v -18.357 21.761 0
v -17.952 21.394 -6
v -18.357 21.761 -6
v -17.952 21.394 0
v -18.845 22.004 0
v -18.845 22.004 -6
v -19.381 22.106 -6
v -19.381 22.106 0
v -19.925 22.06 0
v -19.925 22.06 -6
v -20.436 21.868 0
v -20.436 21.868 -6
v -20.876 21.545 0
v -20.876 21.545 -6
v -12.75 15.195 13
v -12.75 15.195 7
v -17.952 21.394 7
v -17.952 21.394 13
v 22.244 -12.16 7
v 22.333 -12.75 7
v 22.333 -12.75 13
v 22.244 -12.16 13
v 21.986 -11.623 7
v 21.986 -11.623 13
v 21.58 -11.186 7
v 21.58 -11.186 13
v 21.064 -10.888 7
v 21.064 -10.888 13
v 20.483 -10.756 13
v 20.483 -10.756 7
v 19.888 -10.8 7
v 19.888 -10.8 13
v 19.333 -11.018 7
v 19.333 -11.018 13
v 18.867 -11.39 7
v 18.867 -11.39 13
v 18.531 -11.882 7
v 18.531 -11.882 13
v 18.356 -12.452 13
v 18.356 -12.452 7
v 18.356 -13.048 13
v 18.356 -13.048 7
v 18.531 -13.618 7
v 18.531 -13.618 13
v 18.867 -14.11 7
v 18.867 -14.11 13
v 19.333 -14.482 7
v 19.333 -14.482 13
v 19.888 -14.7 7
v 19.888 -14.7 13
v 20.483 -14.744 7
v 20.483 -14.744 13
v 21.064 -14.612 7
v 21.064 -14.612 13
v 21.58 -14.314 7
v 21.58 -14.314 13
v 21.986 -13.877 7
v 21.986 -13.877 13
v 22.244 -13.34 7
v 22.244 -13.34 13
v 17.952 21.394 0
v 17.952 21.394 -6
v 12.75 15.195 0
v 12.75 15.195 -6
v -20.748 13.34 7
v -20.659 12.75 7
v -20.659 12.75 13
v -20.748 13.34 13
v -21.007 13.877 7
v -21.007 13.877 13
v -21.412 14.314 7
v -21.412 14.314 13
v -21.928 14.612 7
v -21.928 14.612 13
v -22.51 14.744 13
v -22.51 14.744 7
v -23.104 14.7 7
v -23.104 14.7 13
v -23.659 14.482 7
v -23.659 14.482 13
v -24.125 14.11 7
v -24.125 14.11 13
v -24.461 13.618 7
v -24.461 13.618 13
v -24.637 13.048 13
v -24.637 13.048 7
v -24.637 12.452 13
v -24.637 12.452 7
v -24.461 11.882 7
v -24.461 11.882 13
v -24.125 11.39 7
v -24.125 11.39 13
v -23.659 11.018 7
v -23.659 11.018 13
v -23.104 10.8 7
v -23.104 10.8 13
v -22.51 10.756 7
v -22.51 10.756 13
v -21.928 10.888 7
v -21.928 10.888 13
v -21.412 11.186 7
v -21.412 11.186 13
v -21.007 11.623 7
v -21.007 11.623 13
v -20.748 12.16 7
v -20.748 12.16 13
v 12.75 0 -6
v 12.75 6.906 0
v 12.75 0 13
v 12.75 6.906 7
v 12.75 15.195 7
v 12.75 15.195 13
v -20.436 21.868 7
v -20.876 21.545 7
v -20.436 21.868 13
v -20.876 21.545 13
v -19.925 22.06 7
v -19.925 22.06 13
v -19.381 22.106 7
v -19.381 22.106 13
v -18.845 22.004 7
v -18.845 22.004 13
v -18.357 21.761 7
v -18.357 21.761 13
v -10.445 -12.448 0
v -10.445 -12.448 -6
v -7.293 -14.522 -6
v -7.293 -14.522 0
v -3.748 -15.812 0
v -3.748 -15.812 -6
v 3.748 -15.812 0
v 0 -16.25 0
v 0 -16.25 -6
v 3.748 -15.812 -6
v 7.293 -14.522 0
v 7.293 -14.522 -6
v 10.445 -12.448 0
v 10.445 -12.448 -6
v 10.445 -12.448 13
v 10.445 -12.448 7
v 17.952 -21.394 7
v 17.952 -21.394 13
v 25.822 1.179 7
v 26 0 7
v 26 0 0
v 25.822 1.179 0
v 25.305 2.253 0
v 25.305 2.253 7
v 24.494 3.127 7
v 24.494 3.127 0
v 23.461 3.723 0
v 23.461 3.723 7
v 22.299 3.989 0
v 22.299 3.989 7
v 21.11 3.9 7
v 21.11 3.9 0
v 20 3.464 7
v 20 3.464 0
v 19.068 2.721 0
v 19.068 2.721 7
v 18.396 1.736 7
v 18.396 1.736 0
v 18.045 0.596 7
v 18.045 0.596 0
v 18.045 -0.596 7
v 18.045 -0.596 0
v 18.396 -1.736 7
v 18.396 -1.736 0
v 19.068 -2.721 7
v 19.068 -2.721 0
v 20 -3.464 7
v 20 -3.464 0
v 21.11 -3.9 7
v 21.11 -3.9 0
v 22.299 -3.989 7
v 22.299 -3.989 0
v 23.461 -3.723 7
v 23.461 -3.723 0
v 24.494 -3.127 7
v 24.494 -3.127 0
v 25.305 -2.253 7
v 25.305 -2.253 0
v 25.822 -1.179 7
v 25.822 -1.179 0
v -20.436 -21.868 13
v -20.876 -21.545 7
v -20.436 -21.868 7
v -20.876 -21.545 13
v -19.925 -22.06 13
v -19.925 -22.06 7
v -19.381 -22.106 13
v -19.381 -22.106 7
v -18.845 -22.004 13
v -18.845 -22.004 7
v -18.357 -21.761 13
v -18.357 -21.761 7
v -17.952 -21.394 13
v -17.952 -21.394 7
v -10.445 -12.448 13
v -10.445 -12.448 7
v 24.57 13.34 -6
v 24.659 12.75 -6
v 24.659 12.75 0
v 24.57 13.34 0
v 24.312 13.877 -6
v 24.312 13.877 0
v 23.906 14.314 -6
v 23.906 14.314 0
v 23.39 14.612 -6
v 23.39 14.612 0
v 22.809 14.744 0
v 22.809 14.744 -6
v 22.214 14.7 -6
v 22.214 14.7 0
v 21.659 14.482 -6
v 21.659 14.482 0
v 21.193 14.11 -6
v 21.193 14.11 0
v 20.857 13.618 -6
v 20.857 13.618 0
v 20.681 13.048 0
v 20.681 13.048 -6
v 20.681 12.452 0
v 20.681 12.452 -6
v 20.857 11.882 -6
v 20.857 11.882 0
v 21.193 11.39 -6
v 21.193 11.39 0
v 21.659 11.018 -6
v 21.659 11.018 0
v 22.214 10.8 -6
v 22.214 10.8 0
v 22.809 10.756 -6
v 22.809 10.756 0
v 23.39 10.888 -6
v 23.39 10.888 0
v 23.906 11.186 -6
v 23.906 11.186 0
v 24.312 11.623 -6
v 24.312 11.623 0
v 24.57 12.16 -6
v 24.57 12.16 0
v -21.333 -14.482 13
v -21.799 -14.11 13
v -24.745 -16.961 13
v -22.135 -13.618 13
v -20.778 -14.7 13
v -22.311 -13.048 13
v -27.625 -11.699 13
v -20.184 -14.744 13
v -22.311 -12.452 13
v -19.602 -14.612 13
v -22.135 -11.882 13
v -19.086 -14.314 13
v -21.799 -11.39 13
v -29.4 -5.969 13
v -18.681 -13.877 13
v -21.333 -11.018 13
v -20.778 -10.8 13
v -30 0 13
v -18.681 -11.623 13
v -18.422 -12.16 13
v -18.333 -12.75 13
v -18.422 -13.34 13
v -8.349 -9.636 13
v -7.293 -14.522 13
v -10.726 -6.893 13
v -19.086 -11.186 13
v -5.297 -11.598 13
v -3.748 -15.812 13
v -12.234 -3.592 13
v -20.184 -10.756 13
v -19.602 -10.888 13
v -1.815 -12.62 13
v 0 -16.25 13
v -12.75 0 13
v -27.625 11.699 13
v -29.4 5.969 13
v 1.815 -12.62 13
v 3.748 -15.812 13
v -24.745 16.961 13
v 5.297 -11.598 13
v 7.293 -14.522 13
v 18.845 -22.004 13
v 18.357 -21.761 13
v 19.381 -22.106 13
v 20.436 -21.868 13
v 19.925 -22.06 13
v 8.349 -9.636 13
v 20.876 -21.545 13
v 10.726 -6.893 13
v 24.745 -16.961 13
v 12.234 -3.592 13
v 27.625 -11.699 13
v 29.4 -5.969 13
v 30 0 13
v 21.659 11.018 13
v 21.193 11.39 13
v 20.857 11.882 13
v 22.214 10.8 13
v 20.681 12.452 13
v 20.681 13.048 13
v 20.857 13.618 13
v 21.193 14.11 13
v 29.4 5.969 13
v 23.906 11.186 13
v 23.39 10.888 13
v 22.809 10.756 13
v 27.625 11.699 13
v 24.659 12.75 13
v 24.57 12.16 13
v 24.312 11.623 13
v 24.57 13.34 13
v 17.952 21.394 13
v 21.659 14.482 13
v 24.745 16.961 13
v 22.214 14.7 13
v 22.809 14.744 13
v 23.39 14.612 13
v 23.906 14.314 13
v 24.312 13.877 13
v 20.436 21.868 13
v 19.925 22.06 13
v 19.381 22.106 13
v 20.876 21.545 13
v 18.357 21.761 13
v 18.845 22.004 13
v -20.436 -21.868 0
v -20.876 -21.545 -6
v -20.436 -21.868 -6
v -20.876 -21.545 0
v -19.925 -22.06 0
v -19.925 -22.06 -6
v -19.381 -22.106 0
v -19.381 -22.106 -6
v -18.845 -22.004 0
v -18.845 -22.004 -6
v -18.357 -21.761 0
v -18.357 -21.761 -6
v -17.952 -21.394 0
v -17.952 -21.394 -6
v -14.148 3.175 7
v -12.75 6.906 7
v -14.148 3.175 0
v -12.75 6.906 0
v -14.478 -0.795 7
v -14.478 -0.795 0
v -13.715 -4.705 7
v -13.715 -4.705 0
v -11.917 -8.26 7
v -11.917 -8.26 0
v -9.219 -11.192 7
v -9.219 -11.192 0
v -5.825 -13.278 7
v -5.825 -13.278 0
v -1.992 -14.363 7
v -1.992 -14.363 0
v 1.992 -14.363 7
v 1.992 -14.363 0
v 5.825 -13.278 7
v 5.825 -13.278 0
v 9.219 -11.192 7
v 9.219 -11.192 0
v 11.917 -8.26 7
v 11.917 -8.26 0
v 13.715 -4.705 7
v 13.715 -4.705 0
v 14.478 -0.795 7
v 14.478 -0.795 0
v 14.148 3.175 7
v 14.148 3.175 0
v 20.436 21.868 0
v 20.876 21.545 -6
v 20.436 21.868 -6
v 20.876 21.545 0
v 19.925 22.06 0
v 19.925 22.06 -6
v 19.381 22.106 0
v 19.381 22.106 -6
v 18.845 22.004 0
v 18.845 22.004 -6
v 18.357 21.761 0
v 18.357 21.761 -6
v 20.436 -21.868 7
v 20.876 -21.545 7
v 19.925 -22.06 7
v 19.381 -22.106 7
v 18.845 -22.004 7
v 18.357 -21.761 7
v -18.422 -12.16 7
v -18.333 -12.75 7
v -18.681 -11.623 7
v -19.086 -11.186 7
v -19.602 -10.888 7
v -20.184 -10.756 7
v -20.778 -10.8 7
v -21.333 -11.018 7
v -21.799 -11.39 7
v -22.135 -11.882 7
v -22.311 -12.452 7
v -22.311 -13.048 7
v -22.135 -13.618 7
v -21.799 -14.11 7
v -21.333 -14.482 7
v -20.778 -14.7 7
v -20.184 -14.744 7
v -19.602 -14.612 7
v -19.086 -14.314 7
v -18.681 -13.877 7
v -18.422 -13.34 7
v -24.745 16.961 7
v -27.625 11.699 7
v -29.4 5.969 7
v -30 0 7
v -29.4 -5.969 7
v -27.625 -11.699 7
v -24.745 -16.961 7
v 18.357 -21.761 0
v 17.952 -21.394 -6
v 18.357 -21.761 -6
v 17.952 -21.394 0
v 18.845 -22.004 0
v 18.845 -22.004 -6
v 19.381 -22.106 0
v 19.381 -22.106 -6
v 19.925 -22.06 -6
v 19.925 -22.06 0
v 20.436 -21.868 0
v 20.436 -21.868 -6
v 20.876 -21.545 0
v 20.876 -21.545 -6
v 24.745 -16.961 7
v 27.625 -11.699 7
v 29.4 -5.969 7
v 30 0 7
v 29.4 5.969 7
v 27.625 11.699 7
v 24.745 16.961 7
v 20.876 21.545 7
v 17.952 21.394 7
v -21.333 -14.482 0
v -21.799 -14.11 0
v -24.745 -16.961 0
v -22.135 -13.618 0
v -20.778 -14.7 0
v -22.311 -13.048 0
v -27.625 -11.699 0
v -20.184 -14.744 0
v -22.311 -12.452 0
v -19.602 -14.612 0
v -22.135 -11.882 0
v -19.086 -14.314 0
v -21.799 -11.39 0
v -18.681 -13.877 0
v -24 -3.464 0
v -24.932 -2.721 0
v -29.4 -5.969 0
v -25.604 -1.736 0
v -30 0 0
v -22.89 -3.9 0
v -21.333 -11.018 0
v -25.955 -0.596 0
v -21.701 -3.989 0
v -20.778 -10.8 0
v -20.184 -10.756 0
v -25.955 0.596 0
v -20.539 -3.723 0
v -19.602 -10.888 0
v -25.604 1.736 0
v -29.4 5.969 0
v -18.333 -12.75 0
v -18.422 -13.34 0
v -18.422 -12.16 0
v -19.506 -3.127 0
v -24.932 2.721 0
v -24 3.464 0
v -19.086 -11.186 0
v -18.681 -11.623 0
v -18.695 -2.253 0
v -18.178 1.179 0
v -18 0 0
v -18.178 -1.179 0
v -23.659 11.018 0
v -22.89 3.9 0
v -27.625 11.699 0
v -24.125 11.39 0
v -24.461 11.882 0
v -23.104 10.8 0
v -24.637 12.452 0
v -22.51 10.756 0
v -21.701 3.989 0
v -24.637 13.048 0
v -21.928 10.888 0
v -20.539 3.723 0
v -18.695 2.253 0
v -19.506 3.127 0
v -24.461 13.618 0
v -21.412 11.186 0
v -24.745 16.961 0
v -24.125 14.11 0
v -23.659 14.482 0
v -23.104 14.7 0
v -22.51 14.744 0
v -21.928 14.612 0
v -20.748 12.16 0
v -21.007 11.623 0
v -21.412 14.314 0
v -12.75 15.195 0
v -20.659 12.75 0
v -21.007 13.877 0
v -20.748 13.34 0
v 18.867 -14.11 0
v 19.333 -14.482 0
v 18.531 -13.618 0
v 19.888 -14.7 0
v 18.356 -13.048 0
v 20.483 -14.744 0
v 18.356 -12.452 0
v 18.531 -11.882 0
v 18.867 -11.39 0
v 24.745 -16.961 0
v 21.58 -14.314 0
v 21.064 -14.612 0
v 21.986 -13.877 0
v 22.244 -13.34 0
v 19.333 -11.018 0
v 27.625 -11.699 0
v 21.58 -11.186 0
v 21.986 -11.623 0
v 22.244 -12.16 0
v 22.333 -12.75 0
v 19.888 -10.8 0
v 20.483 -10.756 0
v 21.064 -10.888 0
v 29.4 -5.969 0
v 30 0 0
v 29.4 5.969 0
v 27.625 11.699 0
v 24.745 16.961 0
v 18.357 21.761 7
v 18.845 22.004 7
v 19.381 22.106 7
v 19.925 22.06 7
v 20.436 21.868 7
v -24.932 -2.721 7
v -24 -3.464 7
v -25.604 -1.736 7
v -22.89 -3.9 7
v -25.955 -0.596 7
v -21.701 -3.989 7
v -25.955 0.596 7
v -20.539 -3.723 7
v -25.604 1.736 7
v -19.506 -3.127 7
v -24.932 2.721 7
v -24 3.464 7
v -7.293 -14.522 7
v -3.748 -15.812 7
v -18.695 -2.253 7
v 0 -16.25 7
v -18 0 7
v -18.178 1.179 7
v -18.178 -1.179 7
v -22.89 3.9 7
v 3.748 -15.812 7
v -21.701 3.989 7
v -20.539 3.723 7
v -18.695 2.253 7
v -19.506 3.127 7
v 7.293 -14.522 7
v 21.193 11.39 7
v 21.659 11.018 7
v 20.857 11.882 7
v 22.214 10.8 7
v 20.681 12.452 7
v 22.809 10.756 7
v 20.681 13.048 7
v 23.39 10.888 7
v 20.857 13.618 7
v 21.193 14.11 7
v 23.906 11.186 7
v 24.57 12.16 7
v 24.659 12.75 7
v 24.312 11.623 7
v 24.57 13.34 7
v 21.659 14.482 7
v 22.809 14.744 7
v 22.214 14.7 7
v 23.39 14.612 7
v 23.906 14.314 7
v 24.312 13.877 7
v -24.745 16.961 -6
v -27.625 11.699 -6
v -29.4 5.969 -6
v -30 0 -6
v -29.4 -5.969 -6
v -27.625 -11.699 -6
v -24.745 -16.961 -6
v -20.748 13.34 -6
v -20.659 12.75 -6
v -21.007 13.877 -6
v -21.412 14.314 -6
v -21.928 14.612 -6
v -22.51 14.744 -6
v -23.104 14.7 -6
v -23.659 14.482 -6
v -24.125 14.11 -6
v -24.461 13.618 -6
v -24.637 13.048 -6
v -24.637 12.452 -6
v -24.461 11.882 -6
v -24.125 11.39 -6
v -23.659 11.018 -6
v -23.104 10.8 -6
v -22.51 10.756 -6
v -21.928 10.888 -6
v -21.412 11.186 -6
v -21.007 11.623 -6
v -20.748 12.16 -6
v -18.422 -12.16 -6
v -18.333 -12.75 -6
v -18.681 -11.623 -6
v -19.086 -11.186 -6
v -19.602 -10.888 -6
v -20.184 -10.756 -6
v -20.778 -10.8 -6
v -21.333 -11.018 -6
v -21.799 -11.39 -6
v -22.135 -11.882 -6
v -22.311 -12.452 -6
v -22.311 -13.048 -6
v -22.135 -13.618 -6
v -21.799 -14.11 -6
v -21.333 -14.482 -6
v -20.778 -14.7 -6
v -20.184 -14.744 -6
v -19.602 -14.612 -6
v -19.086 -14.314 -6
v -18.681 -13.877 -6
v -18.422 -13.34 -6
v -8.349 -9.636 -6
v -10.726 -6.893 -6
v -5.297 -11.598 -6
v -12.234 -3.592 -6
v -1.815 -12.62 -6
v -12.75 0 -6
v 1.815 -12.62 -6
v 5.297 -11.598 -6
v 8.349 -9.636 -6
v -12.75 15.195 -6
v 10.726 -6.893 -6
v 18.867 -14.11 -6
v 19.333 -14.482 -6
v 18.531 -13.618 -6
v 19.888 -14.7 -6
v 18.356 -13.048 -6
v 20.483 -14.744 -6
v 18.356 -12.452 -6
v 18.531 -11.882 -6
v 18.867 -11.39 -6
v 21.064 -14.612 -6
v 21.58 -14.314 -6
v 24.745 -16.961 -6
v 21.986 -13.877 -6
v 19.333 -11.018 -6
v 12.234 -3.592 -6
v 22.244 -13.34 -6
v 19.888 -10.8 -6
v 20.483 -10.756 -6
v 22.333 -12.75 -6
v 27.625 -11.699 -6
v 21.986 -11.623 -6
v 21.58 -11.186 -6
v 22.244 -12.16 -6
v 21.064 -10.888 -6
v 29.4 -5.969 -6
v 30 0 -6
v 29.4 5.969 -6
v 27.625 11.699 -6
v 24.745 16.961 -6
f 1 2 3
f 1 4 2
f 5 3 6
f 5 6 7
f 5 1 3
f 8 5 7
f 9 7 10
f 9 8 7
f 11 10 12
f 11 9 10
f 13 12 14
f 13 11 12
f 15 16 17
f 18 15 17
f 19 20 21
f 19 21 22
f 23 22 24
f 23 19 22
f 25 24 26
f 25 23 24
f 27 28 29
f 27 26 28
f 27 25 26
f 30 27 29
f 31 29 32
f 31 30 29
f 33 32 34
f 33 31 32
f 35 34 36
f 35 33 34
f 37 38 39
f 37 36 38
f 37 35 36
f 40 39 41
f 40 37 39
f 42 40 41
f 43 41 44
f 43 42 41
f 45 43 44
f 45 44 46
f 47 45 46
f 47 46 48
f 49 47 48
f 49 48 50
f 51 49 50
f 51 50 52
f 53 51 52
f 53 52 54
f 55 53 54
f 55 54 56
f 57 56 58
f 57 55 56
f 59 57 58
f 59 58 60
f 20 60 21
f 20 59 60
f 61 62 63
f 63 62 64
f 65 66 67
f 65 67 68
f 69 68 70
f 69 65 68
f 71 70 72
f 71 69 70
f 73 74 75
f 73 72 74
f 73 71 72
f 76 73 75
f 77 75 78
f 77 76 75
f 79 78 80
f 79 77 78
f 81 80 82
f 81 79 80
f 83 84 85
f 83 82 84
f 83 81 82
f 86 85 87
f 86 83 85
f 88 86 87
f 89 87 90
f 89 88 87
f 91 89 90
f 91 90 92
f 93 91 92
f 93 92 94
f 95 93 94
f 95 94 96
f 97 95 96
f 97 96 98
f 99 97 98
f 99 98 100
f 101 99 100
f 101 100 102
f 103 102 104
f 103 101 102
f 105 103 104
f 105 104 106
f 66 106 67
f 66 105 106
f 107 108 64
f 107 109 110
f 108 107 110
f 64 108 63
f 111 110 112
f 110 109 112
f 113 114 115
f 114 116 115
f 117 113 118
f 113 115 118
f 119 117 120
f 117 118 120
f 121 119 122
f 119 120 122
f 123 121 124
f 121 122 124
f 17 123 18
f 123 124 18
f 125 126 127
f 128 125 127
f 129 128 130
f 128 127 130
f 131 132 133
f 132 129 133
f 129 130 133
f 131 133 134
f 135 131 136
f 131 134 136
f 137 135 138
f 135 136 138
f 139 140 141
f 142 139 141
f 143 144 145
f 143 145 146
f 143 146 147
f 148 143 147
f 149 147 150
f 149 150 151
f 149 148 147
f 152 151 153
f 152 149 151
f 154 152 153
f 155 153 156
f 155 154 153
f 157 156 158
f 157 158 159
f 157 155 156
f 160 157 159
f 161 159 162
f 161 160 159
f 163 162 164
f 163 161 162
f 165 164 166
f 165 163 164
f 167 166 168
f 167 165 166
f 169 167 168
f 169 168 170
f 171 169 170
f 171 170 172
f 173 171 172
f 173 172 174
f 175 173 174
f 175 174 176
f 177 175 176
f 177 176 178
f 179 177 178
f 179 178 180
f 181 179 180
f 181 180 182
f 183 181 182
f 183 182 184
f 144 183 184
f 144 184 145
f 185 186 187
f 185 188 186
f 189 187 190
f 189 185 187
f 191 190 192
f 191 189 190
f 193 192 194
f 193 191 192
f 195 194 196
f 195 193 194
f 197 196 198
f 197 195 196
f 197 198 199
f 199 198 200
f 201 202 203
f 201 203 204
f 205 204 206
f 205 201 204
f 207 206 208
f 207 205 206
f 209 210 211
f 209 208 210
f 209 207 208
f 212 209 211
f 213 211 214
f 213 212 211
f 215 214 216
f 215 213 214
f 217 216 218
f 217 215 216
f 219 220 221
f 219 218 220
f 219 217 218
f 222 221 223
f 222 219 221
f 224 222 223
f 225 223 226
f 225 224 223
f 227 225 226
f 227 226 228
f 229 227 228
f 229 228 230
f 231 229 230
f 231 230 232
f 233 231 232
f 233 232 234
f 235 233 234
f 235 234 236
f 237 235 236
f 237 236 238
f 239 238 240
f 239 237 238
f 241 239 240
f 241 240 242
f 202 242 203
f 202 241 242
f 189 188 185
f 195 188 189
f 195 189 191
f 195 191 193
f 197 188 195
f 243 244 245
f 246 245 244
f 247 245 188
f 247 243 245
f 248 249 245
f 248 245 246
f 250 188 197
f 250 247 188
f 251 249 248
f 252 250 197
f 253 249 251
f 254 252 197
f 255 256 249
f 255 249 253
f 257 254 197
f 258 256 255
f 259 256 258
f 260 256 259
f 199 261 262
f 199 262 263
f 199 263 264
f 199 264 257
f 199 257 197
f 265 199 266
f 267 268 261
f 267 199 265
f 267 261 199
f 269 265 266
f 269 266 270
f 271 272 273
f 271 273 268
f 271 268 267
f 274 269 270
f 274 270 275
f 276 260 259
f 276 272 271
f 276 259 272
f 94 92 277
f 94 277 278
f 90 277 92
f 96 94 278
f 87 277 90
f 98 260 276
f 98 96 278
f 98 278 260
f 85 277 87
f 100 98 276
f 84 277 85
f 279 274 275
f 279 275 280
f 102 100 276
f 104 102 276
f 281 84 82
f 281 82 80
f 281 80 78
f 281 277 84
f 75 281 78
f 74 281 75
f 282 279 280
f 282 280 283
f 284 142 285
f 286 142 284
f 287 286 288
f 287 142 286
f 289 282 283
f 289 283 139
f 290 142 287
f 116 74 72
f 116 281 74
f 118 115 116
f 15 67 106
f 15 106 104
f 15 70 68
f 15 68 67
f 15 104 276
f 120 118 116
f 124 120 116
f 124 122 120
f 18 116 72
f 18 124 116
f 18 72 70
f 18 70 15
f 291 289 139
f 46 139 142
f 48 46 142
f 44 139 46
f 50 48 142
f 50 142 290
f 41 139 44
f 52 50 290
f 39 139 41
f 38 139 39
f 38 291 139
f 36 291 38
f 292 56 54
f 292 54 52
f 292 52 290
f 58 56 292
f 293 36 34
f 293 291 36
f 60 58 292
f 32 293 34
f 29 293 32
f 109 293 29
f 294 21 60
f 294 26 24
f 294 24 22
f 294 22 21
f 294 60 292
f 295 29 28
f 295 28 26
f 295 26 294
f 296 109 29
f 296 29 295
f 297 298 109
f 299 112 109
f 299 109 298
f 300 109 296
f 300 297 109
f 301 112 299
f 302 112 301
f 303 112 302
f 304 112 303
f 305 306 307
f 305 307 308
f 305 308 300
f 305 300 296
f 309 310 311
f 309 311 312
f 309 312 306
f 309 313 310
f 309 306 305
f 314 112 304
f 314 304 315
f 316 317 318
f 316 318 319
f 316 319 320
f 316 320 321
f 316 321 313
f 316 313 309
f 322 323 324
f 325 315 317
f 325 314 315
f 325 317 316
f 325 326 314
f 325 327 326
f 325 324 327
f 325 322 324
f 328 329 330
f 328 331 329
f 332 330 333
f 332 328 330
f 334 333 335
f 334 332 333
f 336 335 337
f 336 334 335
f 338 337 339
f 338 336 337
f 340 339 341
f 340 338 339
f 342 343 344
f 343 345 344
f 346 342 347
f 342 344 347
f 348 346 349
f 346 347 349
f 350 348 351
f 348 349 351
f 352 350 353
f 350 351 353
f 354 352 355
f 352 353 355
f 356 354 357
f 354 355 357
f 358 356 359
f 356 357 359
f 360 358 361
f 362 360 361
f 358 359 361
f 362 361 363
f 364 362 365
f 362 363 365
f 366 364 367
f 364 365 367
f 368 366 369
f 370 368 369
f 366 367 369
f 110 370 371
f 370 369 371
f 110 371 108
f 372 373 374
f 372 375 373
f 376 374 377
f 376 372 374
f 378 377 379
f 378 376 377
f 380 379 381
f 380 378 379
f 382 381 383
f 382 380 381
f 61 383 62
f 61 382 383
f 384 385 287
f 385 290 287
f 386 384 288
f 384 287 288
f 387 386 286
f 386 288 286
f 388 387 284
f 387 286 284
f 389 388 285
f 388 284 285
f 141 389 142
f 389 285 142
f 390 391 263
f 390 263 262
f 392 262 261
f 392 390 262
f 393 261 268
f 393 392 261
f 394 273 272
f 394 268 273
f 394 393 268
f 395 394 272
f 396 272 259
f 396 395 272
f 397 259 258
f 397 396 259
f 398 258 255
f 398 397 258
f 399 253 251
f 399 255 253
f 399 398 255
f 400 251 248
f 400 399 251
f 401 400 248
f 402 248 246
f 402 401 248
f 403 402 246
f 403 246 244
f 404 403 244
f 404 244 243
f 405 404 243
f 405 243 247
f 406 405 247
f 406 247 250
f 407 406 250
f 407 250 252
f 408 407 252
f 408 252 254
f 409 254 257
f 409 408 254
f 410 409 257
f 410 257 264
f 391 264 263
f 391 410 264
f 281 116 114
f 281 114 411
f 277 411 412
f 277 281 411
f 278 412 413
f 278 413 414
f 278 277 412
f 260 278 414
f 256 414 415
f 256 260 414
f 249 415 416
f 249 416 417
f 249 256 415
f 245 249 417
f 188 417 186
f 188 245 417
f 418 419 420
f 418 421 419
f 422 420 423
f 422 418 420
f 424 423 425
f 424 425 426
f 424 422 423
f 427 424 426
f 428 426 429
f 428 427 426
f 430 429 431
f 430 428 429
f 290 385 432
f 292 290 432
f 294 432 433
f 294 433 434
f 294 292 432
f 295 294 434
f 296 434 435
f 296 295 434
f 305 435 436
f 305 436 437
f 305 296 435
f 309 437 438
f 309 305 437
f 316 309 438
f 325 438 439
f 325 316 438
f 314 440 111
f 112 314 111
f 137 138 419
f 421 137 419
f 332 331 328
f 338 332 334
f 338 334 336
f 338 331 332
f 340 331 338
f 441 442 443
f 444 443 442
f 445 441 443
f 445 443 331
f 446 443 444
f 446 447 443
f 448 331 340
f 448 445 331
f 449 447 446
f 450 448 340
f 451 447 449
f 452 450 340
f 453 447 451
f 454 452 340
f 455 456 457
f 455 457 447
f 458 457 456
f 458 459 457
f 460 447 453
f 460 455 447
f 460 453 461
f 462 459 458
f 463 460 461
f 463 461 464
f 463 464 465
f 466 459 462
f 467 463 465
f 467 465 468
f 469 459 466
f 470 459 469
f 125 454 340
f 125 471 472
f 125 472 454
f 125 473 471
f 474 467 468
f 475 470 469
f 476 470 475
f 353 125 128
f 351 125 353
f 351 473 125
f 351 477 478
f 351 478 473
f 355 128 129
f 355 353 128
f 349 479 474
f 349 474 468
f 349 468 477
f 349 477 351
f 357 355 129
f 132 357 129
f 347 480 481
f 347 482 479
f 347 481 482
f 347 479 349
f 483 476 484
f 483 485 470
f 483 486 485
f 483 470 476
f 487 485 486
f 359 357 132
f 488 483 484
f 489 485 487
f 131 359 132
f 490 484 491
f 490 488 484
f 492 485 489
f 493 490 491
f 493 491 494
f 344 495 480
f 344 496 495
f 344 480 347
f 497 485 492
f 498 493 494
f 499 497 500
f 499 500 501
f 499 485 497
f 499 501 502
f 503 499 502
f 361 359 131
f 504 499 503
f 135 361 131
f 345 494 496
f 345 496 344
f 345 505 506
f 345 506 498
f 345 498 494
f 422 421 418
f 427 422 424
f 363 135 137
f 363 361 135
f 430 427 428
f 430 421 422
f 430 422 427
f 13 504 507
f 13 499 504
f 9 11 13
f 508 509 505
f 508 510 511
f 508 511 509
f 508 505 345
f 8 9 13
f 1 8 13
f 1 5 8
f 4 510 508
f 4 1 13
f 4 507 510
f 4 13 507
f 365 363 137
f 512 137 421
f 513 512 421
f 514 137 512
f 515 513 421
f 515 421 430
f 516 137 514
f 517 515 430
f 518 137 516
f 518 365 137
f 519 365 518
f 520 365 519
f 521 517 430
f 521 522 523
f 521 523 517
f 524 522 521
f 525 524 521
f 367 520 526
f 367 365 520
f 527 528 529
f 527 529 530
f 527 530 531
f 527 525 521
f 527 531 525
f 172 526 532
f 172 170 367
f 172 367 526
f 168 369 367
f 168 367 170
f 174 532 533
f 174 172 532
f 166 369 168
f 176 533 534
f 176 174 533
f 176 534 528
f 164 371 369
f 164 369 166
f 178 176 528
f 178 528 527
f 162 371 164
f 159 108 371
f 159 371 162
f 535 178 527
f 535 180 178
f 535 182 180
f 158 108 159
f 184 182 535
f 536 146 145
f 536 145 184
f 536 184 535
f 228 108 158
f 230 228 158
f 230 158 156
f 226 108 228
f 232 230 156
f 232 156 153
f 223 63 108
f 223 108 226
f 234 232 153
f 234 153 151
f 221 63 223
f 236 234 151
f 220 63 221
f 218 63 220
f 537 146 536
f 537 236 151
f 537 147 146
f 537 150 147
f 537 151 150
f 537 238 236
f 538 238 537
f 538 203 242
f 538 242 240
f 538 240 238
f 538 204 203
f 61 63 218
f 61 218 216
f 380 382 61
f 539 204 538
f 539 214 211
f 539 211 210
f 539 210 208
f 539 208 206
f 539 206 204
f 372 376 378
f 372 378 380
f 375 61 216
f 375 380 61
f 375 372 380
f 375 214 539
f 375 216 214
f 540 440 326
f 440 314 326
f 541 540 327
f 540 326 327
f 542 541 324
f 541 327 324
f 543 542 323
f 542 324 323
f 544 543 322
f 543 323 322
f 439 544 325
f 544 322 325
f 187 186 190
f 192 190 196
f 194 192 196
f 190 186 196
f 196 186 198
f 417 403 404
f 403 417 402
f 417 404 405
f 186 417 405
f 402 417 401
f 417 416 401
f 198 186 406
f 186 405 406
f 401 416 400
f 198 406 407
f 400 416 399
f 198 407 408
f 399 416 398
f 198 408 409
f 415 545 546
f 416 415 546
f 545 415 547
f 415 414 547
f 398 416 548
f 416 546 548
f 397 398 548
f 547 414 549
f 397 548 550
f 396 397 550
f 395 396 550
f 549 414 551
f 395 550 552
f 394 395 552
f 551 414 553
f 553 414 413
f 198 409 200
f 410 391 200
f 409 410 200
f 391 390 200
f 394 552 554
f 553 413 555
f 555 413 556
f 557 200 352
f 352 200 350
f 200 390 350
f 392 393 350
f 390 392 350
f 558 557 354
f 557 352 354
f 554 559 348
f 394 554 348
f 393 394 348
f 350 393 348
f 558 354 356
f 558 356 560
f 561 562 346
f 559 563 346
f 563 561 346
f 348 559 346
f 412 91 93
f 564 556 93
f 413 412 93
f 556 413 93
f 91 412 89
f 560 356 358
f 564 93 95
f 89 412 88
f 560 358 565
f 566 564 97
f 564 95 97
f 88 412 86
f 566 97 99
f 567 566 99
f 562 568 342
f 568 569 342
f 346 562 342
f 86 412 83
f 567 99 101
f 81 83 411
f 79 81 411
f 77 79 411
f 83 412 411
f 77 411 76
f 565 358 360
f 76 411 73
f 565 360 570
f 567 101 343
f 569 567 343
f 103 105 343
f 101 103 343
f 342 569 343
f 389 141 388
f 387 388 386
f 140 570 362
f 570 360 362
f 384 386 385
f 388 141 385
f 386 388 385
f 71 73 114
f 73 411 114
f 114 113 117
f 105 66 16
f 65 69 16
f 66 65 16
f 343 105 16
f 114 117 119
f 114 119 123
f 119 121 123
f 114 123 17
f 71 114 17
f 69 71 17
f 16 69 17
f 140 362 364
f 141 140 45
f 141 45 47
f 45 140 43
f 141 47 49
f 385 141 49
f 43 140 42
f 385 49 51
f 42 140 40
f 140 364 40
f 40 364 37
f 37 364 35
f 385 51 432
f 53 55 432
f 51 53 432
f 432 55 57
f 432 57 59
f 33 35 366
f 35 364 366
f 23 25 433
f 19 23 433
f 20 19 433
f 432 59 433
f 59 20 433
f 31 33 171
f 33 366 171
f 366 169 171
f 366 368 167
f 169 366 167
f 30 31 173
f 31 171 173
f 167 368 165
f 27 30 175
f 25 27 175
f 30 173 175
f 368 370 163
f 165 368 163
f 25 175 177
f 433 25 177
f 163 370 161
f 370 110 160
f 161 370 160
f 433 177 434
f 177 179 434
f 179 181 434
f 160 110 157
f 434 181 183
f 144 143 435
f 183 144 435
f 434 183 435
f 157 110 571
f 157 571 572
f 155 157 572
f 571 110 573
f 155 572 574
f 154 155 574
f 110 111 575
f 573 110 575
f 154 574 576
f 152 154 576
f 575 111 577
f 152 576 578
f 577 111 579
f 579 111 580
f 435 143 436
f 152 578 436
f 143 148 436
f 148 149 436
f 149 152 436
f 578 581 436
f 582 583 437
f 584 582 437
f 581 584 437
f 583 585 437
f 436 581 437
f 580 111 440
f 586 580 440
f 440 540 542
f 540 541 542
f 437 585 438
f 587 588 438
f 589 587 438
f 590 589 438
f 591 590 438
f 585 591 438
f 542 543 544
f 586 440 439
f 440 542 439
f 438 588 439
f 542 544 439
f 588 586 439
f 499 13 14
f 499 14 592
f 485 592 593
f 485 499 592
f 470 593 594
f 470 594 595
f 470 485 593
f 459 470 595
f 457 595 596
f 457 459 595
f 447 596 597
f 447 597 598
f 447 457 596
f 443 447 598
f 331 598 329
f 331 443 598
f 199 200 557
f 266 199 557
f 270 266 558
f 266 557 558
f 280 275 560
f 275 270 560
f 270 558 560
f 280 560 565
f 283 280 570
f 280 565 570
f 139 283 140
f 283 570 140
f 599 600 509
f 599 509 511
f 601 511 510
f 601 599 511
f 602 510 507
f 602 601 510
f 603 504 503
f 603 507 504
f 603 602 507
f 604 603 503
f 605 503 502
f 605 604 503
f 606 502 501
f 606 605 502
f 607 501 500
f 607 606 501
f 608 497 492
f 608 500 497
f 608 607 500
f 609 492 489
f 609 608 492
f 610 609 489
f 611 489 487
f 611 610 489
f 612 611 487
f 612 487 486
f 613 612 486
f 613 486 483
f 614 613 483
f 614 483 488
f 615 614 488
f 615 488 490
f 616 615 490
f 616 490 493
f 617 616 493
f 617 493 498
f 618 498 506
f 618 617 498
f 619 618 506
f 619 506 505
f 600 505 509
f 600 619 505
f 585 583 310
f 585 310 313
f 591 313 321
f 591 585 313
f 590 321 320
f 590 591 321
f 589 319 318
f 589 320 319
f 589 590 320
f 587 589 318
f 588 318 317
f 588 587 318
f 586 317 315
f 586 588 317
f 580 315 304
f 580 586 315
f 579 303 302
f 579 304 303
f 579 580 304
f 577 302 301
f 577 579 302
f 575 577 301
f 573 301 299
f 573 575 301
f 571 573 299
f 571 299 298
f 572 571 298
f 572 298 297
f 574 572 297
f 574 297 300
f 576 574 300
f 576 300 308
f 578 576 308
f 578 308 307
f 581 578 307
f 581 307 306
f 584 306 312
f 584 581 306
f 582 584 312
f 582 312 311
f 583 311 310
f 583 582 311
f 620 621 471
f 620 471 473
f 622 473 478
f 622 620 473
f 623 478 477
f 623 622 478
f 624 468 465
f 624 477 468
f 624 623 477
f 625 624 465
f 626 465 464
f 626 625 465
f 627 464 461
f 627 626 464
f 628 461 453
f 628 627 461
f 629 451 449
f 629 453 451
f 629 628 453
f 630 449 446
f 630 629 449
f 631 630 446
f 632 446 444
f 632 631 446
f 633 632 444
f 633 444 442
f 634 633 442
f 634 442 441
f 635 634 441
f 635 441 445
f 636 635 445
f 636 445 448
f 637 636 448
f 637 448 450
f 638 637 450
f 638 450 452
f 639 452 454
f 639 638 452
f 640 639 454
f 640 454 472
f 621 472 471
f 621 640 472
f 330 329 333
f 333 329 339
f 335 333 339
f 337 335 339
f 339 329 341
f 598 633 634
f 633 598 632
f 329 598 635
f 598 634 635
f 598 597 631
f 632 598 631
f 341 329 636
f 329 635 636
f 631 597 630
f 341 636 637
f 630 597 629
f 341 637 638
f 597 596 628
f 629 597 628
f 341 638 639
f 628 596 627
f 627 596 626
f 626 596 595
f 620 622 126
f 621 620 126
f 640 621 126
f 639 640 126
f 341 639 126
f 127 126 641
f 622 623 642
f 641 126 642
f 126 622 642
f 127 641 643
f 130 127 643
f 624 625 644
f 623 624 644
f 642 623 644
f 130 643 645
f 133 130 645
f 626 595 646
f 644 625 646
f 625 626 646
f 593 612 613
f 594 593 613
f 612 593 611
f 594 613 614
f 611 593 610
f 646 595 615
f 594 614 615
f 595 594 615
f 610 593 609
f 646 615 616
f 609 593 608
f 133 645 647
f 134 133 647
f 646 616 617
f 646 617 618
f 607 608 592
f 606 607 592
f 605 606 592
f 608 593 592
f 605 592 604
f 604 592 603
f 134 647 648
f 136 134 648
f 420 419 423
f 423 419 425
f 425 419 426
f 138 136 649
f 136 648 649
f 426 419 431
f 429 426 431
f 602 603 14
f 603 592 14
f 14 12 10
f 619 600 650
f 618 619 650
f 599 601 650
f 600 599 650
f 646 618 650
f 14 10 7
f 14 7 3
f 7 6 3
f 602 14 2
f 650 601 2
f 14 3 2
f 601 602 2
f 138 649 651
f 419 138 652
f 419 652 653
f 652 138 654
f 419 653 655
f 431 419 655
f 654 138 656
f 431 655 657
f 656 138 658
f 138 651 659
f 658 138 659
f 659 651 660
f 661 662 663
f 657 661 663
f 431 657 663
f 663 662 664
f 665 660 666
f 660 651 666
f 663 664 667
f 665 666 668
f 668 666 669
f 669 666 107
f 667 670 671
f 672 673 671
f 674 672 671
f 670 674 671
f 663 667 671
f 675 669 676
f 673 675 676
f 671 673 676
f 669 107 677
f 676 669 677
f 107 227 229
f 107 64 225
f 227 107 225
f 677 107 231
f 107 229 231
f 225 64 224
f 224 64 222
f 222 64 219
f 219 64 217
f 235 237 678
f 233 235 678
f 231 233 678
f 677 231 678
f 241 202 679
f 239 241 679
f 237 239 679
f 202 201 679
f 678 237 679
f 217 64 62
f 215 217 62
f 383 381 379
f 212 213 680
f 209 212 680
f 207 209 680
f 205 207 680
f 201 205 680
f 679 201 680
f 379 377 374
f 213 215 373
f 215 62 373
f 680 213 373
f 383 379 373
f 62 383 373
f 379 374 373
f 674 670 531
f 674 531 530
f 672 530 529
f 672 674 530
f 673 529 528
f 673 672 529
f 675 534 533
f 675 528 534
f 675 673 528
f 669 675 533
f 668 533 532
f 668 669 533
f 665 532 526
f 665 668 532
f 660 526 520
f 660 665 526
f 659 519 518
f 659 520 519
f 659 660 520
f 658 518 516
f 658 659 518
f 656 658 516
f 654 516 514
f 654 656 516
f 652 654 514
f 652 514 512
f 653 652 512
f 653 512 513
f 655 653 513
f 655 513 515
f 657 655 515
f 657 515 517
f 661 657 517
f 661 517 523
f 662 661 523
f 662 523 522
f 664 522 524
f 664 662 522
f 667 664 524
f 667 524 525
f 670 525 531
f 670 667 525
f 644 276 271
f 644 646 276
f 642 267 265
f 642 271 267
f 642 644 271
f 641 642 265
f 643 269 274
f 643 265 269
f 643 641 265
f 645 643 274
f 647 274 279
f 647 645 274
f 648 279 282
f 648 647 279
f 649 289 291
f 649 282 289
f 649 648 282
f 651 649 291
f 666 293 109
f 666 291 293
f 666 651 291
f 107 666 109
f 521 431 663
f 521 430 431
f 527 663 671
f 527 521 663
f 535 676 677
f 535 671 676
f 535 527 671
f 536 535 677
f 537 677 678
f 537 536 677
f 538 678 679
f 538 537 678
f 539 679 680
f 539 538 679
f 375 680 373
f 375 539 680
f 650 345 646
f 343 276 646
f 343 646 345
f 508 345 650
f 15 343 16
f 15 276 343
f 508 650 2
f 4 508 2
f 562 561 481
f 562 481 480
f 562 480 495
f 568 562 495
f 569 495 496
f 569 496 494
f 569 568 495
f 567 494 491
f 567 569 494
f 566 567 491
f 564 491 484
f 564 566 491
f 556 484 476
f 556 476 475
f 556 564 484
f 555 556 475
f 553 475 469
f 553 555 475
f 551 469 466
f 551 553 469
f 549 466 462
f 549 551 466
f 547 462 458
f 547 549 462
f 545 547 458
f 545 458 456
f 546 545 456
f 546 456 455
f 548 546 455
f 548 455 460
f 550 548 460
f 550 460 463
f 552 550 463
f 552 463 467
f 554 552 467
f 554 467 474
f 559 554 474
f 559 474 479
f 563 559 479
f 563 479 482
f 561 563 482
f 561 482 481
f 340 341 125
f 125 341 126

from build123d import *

# Parameters (mm, degrees)
SKETCH1_R               = 30
BOSS_EXTRUDE1_DEPTH     = 6
SKETCH2_R               = 14.5
BOSS_EXTRUDE2_DEPTH     = 13
CUT_EXTRUDE1_DEPTH      = 47.486557197
CUT_EXTRUDE1_DEPTH_BACK = 47.486557197
SKETCH3_R               = 12.75
BOSS_EXTRUDE4_START     = 13
SKETCH5_R               = 30
SKETCH5_R_2             = 12.75
BOSS_EXTRUDE4_DEPTH     = 6
CUT_EXTRUDE2_DEPTH      = 45.373415465
CUT_EXTRUDE2_DEPTH_BACK = 45.373415465
SKETCH6_R               = 2
CUT_EXTRUDE3_DEPTH      = 47.486557197
CUT_EXTRUDE3_DEPTH_BACK = 47.486557197
FILLET1_R               = 2
FILLET2_R               = 2
FILLET3_R               = 2
FILLET4_R               = 2
SKETCH8_R               = 4
BOSS_EXTRUDE5_DEPTH     = 13
FILLET5_R               = 2
FILLET6_R               = 2
FILLET7_R               = 2
FILLET8_R               = 2
CUT_EXTRUDE4_DEPTH      = 42.830642507
CUT_EXTRUDE4_DEPTH_BACK = 42.830642507
SKETCH11_W              = 25.5
SKETCH11_H              = 25


with BuildPart() as part:
    # Sketch1 → Boss-Extrude1 (new body)
    with BuildSketch(Plane.XY):
        Circle(SKETCH1_R)
    extrude(amount=-BOSS_EXTRUDE1_DEPTH)

    # Sketch2 → Boss-Extrude2 (add)
    with BuildSketch(Plane.XY):
        with Locations(Location((0, 0, 0), (0, 0, 180))):
            Circle(SKETCH2_R)
    extrude(amount=BOSS_EXTRUDE2_DEPTH)

    # Sketch3 → Cut-Extrude1 (cut, two sides: drawn at the far end of the back side and taken through both)
    with BuildSketch(Plane.XY.offset(13).offset(-CUT_EXTRUDE1_DEPTH_BACK)):
        Circle(SKETCH3_R)
    extrude(amount=CUT_EXTRUDE1_DEPTH + CUT_EXTRUDE1_DEPTH_BACK, mode=Mode.SUBTRACT)

    # Sketch5 → Boss-Extrude4 (add)
    with BuildSketch(Plane.XY.offset(BOSS_EXTRUDE4_START)):
        Circle(SKETCH5_R)
        Circle(SKETCH5_R_2, mode=Mode.SUBTRACT)
    extrude(amount=-BOSS_EXTRUDE4_DEPTH)

    # Sketch6 → Cut-Extrude2 (cut, two sides: drawn at the far end of the back side and taken through both)
    with BuildSketch(Plane.XY.offset(-CUT_EXTRUDE2_DEPTH_BACK)):
        with Locations((-20.333162568, -12.75)):
            Circle(SKETCH6_R)
        with Locations((-22.659159296, 12.75)):
            Circle(SKETCH6_R)
        with Locations((20.333162568, -12.75)):
            Circle(SKETCH6_R)
        with Locations((22.659159296, 12.75)):
            Circle(SKETCH6_R)
    extrude(amount=CUT_EXTRUDE2_DEPTH + CUT_EXTRUDE2_DEPTH_BACK, mode=Mode.SUBTRACT)

    # Sketch7 → Cut-Extrude3 (cut, two sides: drawn at the far end of the back side and taken through both)
    with BuildSketch(Plane.XY.offset(13).offset(-CUT_EXTRUDE3_DEPTH_BACK)):
        with BuildLine():
            Line((10.445298657, -12.448222201), (19.283628291, -22.981333294))
            ThreePointArc((19.283628291, -22.981333294), (0, -30), (-19.283628291, -22.981333294))
            Line((-19.283628291, -22.981333294), (-10.445298657, -12.448222201))
            ThreePointArc((-10.445298657, -12.448222201), (0, -16.25), (10.445298657, -12.448222201))
        make_face()
        with BuildLine():
            Line((-10.445298657, 12.448222201), (-19.283628291, 22.981333294))
            ThreePointArc((-19.283628291, 22.981333294), (0, 30), (19.283628291, 22.981333294))
            Line((19.283628291, 22.981333294), (10.445298657, 12.448222201))
            ThreePointArc((10.445298657, 12.448222201), (0, 16.25), (-10.445298657, 12.448222201))
        make_face()
    extrude(amount=CUT_EXTRUDE3_DEPTH + CUT_EXTRUDE3_DEPTH_BACK, mode=Mode.SUBTRACT)

    # Fillet1
    fillet1_edges = [part.edges().sort_by_distance(p)[0] for p in [
        (-19.283628291, -22.981333294, 10),
    ]]
    fillet(fillet1_edges, radius=FILLET1_R)

    # Fillet2
    fillet2_edges = [part.edges().sort_by_distance(p)[0] for p in [
        (-19.283628291, 22.981333294, 10),
    ]]
    fillet(fillet2_edges, radius=FILLET2_R)

    # Fillet3
    fillet3_edges = [part.edges().sort_by_distance(p)[0] for p in [
        (19.283628291, 22.981333294, 10),
    ]]
    fillet(fillet3_edges, radius=FILLET3_R)

    # Fillet4
    fillet4_edges = [part.edges().sort_by_distance(p)[0] for p in [
        (19.283628291, -22.981333294, 10),
    ]]
    fillet(fillet4_edges, radius=FILLET4_R)

    # Sketch8 → Boss-Extrude5 (add)
    with BuildSketch(Plane.XY.offset(13)):
        with Locations((-22, 0)):
            Circle(SKETCH8_R)
        with Locations((22, 0)):
            Circle(SKETCH8_R)
    extrude(amount=-BOSS_EXTRUDE5_DEPTH)

    # Fillet5
    fillet5_edges = [part.edges().sort_by_distance(p)[0] for p in [
        (-19.283628291, 22.981333294, -3),
    ]]
    fillet(fillet5_edges, radius=FILLET5_R)

    # Fillet6
    fillet6_edges = [part.edges().sort_by_distance(p)[0] for p in [
        (-19.283628291, -22.981333294, -3),
    ]]
    fillet(fillet6_edges, radius=FILLET6_R)

    # Fillet7
    fillet7_edges = [part.edges().sort_by_distance(p)[0] for p in [
        (19.283628291, -22.981333294, -3),
    ]]
    fillet(fillet7_edges, radius=FILLET7_R)

    # Fillet8
    fillet8_edges = [part.edges().sort_by_distance(p)[0] for p in [
        (19.283628291, 22.981333294, -3),
    ]]
    fillet(fillet8_edges, radius=FILLET8_R)

    # Sketch11 → Cut-Extrude4 (cut, two sides: drawn at the far end of the back side and taken through both)
    with BuildSketch(Plane(origin=(0, 0, -6), x_dir=(-1, 0, 0), z_dir=(0, 0, -1)).offset(-CUT_EXTRUDE4_DEPTH_BACK)):
        with Locations((0, 12.5)):
            Rectangle(SKETCH11_W, SKETCH11_H)
    extrude(amount=CUT_EXTRUDE4_DEPTH + CUT_EXTRUDE4_DEPTH_BACK, mode=Mode.SUBTRACT)


solid = part.part
